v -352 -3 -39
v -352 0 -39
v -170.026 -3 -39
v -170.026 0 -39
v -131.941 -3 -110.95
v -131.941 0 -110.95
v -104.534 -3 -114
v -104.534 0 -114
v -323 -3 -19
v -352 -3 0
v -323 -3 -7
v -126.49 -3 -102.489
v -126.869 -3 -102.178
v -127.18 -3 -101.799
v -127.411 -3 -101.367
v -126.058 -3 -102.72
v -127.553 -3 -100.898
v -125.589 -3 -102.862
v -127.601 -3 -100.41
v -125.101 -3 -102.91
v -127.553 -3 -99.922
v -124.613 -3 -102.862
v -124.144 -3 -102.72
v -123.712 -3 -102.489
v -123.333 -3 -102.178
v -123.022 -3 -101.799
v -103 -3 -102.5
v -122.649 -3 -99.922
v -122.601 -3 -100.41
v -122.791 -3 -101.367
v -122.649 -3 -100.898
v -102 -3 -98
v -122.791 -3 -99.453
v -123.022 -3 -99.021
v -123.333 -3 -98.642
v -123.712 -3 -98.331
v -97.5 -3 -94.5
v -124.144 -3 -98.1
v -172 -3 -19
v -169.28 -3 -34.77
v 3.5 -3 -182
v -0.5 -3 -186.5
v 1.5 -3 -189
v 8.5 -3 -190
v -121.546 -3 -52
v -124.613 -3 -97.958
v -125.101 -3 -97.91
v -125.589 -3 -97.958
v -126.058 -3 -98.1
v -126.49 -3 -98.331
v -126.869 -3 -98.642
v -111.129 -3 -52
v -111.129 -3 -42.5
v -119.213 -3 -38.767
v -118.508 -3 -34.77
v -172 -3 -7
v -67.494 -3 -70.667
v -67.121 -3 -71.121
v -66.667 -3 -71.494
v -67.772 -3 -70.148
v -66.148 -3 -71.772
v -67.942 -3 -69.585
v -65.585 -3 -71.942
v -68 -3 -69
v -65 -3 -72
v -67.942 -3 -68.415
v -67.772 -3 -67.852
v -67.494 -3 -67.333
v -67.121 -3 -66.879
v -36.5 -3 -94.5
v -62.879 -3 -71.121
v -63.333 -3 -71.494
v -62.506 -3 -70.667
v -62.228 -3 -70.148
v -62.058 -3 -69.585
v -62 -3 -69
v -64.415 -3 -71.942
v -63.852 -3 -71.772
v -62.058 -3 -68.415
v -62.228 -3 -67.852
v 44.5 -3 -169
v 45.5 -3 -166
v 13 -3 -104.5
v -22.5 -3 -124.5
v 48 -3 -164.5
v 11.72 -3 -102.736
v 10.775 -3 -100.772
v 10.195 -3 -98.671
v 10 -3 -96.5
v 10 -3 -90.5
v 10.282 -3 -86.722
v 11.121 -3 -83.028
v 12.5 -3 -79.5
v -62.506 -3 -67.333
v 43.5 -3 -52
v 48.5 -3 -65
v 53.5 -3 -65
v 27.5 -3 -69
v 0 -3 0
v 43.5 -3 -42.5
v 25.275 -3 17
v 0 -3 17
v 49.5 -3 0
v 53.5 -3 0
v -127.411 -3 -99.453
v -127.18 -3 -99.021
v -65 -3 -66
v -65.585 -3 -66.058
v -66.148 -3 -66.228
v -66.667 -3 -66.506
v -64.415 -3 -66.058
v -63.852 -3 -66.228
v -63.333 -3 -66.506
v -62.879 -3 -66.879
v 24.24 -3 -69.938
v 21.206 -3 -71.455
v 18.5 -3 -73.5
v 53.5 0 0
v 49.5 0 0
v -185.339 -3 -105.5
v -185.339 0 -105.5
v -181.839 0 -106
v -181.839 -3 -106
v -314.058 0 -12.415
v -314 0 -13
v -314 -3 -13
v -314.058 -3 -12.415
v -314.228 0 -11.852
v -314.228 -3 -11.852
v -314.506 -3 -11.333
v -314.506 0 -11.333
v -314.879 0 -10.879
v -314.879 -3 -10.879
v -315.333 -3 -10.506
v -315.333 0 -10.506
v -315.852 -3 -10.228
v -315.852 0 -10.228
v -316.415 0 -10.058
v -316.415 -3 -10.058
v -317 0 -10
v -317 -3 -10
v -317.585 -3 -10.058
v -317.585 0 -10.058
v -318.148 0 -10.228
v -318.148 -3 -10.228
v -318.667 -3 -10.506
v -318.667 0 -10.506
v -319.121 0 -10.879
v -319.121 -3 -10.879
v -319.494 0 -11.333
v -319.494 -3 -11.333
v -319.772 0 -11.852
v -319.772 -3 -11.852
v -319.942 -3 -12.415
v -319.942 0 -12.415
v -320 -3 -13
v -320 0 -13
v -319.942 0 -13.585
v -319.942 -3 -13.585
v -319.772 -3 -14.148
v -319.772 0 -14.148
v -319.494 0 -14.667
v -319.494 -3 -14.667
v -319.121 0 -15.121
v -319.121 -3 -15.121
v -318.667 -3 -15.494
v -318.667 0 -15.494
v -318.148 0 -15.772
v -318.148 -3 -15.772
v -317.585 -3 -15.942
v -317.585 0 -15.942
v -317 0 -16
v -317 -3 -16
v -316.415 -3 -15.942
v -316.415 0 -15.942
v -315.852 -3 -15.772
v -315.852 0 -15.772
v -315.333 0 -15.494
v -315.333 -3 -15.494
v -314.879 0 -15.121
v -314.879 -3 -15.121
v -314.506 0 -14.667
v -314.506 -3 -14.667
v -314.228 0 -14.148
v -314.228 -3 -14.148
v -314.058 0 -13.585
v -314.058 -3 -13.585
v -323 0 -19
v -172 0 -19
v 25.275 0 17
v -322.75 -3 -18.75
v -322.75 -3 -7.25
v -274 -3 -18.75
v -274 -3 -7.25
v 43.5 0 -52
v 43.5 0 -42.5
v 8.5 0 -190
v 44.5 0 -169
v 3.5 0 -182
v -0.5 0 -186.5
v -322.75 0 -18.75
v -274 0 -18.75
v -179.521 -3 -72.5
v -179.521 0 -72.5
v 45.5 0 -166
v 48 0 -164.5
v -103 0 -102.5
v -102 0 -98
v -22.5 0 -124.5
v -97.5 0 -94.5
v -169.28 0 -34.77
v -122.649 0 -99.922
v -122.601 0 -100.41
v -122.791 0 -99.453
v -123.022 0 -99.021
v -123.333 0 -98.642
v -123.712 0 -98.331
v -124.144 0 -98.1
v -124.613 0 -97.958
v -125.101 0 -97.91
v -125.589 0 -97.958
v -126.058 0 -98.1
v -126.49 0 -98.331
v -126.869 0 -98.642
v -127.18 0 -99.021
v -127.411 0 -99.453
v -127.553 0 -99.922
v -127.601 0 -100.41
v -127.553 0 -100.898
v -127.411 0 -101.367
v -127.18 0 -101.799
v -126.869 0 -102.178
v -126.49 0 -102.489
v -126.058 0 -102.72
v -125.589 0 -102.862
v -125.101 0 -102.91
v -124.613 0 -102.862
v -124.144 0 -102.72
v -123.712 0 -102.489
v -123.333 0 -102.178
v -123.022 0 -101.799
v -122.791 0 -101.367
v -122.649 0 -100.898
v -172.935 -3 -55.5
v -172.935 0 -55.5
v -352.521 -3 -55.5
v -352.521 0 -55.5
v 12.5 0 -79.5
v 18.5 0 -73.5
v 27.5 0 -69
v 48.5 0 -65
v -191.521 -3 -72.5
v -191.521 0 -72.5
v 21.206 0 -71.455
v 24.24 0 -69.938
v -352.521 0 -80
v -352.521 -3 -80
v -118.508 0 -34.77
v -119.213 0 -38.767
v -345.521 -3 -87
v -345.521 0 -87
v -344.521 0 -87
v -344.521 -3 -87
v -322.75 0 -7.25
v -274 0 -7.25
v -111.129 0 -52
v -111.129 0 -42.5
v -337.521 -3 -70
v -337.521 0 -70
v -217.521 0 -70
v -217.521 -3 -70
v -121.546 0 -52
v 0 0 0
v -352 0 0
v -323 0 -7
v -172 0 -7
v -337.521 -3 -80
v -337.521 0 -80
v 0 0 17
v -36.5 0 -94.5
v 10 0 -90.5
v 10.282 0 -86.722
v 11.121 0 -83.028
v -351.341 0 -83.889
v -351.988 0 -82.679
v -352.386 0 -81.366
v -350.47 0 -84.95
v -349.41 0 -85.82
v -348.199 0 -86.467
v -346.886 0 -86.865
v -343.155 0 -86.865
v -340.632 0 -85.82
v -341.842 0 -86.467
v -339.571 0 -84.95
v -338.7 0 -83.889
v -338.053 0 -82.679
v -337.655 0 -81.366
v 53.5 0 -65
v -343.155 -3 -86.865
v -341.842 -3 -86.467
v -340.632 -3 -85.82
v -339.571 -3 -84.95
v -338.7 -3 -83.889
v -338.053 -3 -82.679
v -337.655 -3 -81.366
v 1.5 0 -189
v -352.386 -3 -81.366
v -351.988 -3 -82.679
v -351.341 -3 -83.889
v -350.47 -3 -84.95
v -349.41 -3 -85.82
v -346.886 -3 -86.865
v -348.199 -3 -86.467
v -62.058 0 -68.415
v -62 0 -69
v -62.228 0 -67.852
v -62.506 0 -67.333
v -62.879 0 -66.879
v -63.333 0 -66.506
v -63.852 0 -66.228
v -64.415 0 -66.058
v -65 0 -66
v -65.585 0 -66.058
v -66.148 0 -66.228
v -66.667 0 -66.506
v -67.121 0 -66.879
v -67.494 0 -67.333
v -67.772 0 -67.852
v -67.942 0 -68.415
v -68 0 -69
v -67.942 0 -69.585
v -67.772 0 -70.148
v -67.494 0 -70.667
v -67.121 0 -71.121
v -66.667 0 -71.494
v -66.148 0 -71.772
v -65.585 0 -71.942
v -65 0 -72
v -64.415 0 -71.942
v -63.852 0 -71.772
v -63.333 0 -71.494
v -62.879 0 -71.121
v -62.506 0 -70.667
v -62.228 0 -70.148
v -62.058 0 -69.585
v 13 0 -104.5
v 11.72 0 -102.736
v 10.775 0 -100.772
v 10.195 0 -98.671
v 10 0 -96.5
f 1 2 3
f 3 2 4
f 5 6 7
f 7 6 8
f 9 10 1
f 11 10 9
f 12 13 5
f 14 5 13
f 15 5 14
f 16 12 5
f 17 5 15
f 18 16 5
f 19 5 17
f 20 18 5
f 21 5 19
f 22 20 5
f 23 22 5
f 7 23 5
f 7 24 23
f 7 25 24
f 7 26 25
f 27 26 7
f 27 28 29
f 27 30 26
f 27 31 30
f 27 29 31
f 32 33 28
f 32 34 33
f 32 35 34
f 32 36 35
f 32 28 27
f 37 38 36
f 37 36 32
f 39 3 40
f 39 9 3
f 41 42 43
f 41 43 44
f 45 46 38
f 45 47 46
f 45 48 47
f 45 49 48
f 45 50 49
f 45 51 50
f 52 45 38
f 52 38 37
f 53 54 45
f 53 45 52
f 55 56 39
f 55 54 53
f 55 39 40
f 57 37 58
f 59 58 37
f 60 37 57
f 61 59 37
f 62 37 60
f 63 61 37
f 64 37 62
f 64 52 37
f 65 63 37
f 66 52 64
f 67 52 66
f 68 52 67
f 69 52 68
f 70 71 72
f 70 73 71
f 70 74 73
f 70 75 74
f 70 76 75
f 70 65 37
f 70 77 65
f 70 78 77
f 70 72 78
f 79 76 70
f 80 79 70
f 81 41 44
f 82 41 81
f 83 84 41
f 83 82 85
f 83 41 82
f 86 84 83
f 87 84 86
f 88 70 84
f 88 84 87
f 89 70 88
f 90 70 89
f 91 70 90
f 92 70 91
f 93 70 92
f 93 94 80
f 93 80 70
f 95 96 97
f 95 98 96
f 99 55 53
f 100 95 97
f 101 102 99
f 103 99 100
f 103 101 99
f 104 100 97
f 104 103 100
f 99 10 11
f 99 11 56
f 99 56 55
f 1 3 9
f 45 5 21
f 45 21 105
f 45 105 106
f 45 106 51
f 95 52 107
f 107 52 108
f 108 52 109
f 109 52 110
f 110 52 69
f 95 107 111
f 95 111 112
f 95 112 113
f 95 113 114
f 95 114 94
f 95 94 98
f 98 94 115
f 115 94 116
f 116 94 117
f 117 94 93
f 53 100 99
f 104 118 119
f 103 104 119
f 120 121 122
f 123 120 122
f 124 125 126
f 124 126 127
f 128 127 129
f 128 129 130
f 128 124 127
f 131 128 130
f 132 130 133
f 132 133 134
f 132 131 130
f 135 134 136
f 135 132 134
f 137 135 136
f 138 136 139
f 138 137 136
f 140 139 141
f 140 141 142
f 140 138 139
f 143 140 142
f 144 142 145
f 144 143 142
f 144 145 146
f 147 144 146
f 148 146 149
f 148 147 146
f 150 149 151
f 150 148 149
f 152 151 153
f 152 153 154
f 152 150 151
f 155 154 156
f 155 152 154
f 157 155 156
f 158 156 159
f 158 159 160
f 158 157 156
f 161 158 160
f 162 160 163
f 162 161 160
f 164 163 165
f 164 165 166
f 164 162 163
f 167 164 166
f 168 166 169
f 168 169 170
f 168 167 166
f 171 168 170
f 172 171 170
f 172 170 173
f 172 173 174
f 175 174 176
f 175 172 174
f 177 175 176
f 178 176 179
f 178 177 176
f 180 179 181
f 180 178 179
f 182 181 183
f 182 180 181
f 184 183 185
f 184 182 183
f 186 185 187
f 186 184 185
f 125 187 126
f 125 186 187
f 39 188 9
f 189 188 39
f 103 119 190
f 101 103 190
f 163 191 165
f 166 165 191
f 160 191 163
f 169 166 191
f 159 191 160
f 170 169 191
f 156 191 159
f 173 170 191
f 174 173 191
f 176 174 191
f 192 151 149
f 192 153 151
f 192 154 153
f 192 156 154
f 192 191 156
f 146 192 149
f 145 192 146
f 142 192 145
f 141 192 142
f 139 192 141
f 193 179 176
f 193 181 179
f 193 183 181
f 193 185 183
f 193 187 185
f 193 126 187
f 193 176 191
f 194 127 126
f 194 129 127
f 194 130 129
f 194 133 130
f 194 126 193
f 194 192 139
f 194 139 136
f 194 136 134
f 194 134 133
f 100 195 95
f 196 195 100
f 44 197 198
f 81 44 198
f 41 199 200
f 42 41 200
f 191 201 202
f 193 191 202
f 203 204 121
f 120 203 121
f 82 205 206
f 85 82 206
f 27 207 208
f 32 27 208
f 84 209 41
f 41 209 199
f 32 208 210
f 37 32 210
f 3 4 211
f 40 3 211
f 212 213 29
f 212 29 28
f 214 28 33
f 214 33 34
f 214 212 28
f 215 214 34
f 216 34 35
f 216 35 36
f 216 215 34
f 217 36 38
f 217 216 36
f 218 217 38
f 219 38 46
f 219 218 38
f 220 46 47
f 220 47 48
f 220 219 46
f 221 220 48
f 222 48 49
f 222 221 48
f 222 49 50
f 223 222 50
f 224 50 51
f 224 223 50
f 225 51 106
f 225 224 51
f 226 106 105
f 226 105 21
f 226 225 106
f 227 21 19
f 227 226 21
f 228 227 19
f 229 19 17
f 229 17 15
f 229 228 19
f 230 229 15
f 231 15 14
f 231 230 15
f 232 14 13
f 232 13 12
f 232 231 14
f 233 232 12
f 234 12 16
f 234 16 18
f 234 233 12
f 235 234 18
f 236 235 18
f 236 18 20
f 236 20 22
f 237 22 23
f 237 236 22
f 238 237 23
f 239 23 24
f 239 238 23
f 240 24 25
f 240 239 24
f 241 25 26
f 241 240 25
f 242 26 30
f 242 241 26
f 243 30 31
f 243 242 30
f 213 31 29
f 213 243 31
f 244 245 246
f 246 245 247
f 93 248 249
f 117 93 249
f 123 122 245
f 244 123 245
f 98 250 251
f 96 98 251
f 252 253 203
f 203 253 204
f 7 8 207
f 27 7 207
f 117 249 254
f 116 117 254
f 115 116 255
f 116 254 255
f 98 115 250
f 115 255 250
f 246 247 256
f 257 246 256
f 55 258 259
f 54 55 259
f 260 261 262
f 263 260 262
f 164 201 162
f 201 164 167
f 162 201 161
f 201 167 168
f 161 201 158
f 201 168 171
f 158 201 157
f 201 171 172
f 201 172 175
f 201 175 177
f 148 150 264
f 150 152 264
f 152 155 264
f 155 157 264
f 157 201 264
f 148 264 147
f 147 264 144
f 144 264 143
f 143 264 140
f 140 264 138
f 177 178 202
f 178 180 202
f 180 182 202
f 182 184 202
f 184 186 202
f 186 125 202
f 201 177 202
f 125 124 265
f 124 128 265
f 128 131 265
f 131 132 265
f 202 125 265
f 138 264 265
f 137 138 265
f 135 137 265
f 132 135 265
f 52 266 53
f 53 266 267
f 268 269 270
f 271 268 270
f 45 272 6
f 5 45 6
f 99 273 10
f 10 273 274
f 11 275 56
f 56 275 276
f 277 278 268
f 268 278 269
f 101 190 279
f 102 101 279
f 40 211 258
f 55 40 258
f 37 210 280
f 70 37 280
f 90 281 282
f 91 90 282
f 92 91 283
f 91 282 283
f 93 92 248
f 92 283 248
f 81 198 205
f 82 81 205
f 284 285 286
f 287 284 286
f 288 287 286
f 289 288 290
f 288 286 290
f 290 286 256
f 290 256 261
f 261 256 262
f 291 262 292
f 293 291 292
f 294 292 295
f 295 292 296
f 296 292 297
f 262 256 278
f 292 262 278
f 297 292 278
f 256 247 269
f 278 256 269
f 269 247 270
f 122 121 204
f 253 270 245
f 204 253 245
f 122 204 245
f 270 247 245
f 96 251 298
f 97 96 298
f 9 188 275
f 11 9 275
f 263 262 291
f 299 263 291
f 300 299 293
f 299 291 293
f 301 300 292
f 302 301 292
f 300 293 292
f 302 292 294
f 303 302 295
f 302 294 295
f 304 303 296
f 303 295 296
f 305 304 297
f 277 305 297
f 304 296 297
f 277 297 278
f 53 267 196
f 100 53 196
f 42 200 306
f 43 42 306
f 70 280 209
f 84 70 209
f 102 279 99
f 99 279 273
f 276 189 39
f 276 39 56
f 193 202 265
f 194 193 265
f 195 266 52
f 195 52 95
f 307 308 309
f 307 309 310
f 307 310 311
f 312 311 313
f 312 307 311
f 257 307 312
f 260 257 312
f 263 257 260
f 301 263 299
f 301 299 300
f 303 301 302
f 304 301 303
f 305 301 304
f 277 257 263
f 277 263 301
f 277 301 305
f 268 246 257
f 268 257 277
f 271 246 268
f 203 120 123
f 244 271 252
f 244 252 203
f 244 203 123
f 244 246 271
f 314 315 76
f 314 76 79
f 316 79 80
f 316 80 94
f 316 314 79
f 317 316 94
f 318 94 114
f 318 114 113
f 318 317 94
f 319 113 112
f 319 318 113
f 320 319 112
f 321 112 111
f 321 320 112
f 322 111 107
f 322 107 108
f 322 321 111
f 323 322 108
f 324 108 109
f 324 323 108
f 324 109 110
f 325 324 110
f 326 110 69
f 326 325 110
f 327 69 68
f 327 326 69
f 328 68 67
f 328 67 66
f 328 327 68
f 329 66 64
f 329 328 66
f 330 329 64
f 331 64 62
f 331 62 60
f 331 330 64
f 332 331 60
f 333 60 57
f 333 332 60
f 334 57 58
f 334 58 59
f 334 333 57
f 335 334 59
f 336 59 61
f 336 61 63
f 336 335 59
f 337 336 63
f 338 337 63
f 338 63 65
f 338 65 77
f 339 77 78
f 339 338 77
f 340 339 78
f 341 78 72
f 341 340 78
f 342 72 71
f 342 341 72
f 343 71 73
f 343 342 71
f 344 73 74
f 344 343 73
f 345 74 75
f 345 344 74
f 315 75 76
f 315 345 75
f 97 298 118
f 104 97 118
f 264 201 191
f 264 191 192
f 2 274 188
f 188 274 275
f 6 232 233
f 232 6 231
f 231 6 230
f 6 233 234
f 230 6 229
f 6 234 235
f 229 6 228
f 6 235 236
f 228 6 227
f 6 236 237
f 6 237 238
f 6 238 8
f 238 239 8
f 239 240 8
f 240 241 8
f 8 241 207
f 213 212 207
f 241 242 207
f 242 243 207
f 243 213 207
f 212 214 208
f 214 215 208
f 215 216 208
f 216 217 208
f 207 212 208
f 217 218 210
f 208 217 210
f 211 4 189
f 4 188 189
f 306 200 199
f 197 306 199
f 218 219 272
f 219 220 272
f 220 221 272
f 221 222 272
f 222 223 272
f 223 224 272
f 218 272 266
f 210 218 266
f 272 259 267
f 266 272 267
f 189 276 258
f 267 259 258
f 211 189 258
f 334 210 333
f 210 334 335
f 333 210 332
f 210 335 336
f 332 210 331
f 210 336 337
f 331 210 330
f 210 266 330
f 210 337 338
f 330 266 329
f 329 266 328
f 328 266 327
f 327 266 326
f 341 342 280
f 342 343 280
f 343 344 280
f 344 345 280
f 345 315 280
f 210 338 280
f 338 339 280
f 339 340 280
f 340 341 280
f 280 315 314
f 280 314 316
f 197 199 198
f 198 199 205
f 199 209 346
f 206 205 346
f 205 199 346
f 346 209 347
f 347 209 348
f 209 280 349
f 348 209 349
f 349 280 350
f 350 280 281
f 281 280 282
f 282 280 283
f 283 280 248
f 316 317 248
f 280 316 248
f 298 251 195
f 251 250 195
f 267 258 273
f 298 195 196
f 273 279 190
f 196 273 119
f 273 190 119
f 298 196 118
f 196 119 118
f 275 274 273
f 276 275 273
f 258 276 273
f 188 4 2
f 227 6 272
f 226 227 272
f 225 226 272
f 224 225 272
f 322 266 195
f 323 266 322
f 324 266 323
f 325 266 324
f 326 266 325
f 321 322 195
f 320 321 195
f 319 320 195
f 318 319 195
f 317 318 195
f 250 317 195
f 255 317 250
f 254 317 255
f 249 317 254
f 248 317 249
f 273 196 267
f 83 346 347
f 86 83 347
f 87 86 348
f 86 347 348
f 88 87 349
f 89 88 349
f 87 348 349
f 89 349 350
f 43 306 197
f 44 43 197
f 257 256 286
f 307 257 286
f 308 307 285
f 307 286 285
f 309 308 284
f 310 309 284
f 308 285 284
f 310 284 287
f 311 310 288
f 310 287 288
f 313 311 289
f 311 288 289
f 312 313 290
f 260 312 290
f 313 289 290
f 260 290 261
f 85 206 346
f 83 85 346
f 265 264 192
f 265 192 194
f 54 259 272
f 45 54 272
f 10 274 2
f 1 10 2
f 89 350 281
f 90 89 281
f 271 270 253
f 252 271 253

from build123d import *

# Parameters (mm, degrees)
F0_R     = 2.5
F0_W     = 151
F0_H     = 12
F0_R_2   = 3
F0_W_2   = 154.629
F0_H_2   = 9.5
F1_DEPTH = 3
F0_W_3   = 48.75
F0_H_3   = 11.5


# Not quite as in the source:
# - a feature names something its author has since deleted; it is built from what else it names


with BuildPart() as f1:
    # F0 (on Front) → F1 (new body)
    with BuildSketch(Plane.XZ):
        with BuildLine():
            Line((48.5, -65), (53.5, -65))
            Line((53.5, -65), (53.5, 0))
            Line((53.5, 0), (49.5, 0))
            Line((49.5, 0), (25.275, 17))
            Line((25.275, 17), (0, 17))
            Line((0, 17), (0, 0))
            Line((0, 0), (-352, 0))
            Line((-352, 0), (-352, -39))
            Line((-352, -39), (-170.0255081496, -39))
            Line((-170.0255081496, -39), (-169.2796367248, -34.7699529486))
            Line((-169.2796367248, -34.7699529486), (-118.5083061305, -34.7699529486))
            Line((-118.5083061305, -34.7699529486), (-119.2130711177, -38.7668738074))
            Line((-119.2130711177, -38.7668738074), (-121.5464283045, -52))
            Line((-121.5464283045, -52), (-131.9409607911, -110.9503231145))
            Line((-131.9409607911, -110.9503231145), (-104.5337054221, -114))
            Line((-104.5337054221, -114), (-103, -102.5))
            Line((-103, -102.5), (-102, -98))
            Line((-102, -98), (-97.5, -94.5))
            Line((-97.5, -94.5), (-36.5, -94.5))
            Line((-36.5, -94.5), (-22.5, -124.5))
            Line((-22.5, -124.5), (3.5, -182))
            Line((3.5, -182), (-0.5, -186.5))
            Line((-0.5, -186.5), (1.5, -189))
            Line((1.5, -189), (8.5, -190))
            Line((8.5, -190), (44.5, -169))
            Line((44.5, -169), (45.5, -166))
            Line((45.5, -166), (48, -164.5))
            Line((48, -164.5), (13, -104.5))
            ThreePointArc((13, -104.5), (10.7746616729, -100.7720018727), (10, -96.5))
            Line((10, -96.5), (10, -90.5))
            ThreePointArc((10, -90.5), (10.6328688201, -84.8597429137), (12.5, -79.5))
            Line((12.5, -79.5), (18.5, -73.5))
            ThreePointArc((18.5, -73.5), (22.688171875, -70.6263437501), (27.5, -69))
            Line((27.5, -69), (48.5, -65))
        make_face()
        with Locations((-125.101, -100.41)):
            Circle(F0_R, mode=Mode.SUBTRACT)
        with Locations((-247.5, -13)):
            Rectangle(F0_W, F0_H, mode=Mode.SUBTRACT)
        with Locations((-65, -69)):
            Circle(F0_R_2, mode=Mode.SUBTRACT)
        with Locations((-33.8145, -47.25)):
            Rectangle(F0_W_2, F0_H_2, mode=Mode.SUBTRACT)
    extrude(amount=F1_DEPTH)


with BuildPart() as f1b:
    # F0 (on Front) → F1, piece 2 (new body)
    with BuildSketch(Plane.XZ):
        with BuildLine():
            ThreePointArc((-352.5206254937, -80), (-350.470372962, -84.9497474683), (-345.5206254937, -87))
            Line((-345.5206254937, -87), (-344.5206254937, -87))
            ThreePointArc((-344.5206254937, -87), (-339.5708780254, -84.9497474683), (-337.5206254937, -80))
            Line((-337.5206254937, -80), (-337.5206254937, -70))
            Line((-337.5206254937, -70), (-217.5206254937, -70))
            Line((-217.5206254937, -70), (-191.5206254937, -72.5))
            Line((-191.5206254937, -72.5), (-179.5206254937, -72.5))
            Line((-179.5206254937, -72.5), (-185.3394158571, -105.5))
            Line((-185.3394158571, -105.5), (-181.8394158571, -106))
            Line((-181.8394158571, -106), (-172.9349033313, -55.5))
            Line((-172.9349033313, -55.5), (-352.5206254937, -55.5))
            Line((-352.5206254937, -55.5), (-352.5206254937, -80))
        make_face()
    extrude(amount=F1_DEPTH)


with BuildPart() as f1c:
    # F0 (on Front) → F1, piece 3 (new body)
    with BuildSketch(Plane.XZ):
        with Locations((-298.375, -13)):
            Rectangle(F0_W_3, F0_H_3)
        with Locations((-317, -13)):
            Circle(F0_R_2, mode=Mode.SUBTRACT)
    extrude(amount=F1_DEPTH)


solid = Compound([f1.part, f1b.part, f1c.part])
